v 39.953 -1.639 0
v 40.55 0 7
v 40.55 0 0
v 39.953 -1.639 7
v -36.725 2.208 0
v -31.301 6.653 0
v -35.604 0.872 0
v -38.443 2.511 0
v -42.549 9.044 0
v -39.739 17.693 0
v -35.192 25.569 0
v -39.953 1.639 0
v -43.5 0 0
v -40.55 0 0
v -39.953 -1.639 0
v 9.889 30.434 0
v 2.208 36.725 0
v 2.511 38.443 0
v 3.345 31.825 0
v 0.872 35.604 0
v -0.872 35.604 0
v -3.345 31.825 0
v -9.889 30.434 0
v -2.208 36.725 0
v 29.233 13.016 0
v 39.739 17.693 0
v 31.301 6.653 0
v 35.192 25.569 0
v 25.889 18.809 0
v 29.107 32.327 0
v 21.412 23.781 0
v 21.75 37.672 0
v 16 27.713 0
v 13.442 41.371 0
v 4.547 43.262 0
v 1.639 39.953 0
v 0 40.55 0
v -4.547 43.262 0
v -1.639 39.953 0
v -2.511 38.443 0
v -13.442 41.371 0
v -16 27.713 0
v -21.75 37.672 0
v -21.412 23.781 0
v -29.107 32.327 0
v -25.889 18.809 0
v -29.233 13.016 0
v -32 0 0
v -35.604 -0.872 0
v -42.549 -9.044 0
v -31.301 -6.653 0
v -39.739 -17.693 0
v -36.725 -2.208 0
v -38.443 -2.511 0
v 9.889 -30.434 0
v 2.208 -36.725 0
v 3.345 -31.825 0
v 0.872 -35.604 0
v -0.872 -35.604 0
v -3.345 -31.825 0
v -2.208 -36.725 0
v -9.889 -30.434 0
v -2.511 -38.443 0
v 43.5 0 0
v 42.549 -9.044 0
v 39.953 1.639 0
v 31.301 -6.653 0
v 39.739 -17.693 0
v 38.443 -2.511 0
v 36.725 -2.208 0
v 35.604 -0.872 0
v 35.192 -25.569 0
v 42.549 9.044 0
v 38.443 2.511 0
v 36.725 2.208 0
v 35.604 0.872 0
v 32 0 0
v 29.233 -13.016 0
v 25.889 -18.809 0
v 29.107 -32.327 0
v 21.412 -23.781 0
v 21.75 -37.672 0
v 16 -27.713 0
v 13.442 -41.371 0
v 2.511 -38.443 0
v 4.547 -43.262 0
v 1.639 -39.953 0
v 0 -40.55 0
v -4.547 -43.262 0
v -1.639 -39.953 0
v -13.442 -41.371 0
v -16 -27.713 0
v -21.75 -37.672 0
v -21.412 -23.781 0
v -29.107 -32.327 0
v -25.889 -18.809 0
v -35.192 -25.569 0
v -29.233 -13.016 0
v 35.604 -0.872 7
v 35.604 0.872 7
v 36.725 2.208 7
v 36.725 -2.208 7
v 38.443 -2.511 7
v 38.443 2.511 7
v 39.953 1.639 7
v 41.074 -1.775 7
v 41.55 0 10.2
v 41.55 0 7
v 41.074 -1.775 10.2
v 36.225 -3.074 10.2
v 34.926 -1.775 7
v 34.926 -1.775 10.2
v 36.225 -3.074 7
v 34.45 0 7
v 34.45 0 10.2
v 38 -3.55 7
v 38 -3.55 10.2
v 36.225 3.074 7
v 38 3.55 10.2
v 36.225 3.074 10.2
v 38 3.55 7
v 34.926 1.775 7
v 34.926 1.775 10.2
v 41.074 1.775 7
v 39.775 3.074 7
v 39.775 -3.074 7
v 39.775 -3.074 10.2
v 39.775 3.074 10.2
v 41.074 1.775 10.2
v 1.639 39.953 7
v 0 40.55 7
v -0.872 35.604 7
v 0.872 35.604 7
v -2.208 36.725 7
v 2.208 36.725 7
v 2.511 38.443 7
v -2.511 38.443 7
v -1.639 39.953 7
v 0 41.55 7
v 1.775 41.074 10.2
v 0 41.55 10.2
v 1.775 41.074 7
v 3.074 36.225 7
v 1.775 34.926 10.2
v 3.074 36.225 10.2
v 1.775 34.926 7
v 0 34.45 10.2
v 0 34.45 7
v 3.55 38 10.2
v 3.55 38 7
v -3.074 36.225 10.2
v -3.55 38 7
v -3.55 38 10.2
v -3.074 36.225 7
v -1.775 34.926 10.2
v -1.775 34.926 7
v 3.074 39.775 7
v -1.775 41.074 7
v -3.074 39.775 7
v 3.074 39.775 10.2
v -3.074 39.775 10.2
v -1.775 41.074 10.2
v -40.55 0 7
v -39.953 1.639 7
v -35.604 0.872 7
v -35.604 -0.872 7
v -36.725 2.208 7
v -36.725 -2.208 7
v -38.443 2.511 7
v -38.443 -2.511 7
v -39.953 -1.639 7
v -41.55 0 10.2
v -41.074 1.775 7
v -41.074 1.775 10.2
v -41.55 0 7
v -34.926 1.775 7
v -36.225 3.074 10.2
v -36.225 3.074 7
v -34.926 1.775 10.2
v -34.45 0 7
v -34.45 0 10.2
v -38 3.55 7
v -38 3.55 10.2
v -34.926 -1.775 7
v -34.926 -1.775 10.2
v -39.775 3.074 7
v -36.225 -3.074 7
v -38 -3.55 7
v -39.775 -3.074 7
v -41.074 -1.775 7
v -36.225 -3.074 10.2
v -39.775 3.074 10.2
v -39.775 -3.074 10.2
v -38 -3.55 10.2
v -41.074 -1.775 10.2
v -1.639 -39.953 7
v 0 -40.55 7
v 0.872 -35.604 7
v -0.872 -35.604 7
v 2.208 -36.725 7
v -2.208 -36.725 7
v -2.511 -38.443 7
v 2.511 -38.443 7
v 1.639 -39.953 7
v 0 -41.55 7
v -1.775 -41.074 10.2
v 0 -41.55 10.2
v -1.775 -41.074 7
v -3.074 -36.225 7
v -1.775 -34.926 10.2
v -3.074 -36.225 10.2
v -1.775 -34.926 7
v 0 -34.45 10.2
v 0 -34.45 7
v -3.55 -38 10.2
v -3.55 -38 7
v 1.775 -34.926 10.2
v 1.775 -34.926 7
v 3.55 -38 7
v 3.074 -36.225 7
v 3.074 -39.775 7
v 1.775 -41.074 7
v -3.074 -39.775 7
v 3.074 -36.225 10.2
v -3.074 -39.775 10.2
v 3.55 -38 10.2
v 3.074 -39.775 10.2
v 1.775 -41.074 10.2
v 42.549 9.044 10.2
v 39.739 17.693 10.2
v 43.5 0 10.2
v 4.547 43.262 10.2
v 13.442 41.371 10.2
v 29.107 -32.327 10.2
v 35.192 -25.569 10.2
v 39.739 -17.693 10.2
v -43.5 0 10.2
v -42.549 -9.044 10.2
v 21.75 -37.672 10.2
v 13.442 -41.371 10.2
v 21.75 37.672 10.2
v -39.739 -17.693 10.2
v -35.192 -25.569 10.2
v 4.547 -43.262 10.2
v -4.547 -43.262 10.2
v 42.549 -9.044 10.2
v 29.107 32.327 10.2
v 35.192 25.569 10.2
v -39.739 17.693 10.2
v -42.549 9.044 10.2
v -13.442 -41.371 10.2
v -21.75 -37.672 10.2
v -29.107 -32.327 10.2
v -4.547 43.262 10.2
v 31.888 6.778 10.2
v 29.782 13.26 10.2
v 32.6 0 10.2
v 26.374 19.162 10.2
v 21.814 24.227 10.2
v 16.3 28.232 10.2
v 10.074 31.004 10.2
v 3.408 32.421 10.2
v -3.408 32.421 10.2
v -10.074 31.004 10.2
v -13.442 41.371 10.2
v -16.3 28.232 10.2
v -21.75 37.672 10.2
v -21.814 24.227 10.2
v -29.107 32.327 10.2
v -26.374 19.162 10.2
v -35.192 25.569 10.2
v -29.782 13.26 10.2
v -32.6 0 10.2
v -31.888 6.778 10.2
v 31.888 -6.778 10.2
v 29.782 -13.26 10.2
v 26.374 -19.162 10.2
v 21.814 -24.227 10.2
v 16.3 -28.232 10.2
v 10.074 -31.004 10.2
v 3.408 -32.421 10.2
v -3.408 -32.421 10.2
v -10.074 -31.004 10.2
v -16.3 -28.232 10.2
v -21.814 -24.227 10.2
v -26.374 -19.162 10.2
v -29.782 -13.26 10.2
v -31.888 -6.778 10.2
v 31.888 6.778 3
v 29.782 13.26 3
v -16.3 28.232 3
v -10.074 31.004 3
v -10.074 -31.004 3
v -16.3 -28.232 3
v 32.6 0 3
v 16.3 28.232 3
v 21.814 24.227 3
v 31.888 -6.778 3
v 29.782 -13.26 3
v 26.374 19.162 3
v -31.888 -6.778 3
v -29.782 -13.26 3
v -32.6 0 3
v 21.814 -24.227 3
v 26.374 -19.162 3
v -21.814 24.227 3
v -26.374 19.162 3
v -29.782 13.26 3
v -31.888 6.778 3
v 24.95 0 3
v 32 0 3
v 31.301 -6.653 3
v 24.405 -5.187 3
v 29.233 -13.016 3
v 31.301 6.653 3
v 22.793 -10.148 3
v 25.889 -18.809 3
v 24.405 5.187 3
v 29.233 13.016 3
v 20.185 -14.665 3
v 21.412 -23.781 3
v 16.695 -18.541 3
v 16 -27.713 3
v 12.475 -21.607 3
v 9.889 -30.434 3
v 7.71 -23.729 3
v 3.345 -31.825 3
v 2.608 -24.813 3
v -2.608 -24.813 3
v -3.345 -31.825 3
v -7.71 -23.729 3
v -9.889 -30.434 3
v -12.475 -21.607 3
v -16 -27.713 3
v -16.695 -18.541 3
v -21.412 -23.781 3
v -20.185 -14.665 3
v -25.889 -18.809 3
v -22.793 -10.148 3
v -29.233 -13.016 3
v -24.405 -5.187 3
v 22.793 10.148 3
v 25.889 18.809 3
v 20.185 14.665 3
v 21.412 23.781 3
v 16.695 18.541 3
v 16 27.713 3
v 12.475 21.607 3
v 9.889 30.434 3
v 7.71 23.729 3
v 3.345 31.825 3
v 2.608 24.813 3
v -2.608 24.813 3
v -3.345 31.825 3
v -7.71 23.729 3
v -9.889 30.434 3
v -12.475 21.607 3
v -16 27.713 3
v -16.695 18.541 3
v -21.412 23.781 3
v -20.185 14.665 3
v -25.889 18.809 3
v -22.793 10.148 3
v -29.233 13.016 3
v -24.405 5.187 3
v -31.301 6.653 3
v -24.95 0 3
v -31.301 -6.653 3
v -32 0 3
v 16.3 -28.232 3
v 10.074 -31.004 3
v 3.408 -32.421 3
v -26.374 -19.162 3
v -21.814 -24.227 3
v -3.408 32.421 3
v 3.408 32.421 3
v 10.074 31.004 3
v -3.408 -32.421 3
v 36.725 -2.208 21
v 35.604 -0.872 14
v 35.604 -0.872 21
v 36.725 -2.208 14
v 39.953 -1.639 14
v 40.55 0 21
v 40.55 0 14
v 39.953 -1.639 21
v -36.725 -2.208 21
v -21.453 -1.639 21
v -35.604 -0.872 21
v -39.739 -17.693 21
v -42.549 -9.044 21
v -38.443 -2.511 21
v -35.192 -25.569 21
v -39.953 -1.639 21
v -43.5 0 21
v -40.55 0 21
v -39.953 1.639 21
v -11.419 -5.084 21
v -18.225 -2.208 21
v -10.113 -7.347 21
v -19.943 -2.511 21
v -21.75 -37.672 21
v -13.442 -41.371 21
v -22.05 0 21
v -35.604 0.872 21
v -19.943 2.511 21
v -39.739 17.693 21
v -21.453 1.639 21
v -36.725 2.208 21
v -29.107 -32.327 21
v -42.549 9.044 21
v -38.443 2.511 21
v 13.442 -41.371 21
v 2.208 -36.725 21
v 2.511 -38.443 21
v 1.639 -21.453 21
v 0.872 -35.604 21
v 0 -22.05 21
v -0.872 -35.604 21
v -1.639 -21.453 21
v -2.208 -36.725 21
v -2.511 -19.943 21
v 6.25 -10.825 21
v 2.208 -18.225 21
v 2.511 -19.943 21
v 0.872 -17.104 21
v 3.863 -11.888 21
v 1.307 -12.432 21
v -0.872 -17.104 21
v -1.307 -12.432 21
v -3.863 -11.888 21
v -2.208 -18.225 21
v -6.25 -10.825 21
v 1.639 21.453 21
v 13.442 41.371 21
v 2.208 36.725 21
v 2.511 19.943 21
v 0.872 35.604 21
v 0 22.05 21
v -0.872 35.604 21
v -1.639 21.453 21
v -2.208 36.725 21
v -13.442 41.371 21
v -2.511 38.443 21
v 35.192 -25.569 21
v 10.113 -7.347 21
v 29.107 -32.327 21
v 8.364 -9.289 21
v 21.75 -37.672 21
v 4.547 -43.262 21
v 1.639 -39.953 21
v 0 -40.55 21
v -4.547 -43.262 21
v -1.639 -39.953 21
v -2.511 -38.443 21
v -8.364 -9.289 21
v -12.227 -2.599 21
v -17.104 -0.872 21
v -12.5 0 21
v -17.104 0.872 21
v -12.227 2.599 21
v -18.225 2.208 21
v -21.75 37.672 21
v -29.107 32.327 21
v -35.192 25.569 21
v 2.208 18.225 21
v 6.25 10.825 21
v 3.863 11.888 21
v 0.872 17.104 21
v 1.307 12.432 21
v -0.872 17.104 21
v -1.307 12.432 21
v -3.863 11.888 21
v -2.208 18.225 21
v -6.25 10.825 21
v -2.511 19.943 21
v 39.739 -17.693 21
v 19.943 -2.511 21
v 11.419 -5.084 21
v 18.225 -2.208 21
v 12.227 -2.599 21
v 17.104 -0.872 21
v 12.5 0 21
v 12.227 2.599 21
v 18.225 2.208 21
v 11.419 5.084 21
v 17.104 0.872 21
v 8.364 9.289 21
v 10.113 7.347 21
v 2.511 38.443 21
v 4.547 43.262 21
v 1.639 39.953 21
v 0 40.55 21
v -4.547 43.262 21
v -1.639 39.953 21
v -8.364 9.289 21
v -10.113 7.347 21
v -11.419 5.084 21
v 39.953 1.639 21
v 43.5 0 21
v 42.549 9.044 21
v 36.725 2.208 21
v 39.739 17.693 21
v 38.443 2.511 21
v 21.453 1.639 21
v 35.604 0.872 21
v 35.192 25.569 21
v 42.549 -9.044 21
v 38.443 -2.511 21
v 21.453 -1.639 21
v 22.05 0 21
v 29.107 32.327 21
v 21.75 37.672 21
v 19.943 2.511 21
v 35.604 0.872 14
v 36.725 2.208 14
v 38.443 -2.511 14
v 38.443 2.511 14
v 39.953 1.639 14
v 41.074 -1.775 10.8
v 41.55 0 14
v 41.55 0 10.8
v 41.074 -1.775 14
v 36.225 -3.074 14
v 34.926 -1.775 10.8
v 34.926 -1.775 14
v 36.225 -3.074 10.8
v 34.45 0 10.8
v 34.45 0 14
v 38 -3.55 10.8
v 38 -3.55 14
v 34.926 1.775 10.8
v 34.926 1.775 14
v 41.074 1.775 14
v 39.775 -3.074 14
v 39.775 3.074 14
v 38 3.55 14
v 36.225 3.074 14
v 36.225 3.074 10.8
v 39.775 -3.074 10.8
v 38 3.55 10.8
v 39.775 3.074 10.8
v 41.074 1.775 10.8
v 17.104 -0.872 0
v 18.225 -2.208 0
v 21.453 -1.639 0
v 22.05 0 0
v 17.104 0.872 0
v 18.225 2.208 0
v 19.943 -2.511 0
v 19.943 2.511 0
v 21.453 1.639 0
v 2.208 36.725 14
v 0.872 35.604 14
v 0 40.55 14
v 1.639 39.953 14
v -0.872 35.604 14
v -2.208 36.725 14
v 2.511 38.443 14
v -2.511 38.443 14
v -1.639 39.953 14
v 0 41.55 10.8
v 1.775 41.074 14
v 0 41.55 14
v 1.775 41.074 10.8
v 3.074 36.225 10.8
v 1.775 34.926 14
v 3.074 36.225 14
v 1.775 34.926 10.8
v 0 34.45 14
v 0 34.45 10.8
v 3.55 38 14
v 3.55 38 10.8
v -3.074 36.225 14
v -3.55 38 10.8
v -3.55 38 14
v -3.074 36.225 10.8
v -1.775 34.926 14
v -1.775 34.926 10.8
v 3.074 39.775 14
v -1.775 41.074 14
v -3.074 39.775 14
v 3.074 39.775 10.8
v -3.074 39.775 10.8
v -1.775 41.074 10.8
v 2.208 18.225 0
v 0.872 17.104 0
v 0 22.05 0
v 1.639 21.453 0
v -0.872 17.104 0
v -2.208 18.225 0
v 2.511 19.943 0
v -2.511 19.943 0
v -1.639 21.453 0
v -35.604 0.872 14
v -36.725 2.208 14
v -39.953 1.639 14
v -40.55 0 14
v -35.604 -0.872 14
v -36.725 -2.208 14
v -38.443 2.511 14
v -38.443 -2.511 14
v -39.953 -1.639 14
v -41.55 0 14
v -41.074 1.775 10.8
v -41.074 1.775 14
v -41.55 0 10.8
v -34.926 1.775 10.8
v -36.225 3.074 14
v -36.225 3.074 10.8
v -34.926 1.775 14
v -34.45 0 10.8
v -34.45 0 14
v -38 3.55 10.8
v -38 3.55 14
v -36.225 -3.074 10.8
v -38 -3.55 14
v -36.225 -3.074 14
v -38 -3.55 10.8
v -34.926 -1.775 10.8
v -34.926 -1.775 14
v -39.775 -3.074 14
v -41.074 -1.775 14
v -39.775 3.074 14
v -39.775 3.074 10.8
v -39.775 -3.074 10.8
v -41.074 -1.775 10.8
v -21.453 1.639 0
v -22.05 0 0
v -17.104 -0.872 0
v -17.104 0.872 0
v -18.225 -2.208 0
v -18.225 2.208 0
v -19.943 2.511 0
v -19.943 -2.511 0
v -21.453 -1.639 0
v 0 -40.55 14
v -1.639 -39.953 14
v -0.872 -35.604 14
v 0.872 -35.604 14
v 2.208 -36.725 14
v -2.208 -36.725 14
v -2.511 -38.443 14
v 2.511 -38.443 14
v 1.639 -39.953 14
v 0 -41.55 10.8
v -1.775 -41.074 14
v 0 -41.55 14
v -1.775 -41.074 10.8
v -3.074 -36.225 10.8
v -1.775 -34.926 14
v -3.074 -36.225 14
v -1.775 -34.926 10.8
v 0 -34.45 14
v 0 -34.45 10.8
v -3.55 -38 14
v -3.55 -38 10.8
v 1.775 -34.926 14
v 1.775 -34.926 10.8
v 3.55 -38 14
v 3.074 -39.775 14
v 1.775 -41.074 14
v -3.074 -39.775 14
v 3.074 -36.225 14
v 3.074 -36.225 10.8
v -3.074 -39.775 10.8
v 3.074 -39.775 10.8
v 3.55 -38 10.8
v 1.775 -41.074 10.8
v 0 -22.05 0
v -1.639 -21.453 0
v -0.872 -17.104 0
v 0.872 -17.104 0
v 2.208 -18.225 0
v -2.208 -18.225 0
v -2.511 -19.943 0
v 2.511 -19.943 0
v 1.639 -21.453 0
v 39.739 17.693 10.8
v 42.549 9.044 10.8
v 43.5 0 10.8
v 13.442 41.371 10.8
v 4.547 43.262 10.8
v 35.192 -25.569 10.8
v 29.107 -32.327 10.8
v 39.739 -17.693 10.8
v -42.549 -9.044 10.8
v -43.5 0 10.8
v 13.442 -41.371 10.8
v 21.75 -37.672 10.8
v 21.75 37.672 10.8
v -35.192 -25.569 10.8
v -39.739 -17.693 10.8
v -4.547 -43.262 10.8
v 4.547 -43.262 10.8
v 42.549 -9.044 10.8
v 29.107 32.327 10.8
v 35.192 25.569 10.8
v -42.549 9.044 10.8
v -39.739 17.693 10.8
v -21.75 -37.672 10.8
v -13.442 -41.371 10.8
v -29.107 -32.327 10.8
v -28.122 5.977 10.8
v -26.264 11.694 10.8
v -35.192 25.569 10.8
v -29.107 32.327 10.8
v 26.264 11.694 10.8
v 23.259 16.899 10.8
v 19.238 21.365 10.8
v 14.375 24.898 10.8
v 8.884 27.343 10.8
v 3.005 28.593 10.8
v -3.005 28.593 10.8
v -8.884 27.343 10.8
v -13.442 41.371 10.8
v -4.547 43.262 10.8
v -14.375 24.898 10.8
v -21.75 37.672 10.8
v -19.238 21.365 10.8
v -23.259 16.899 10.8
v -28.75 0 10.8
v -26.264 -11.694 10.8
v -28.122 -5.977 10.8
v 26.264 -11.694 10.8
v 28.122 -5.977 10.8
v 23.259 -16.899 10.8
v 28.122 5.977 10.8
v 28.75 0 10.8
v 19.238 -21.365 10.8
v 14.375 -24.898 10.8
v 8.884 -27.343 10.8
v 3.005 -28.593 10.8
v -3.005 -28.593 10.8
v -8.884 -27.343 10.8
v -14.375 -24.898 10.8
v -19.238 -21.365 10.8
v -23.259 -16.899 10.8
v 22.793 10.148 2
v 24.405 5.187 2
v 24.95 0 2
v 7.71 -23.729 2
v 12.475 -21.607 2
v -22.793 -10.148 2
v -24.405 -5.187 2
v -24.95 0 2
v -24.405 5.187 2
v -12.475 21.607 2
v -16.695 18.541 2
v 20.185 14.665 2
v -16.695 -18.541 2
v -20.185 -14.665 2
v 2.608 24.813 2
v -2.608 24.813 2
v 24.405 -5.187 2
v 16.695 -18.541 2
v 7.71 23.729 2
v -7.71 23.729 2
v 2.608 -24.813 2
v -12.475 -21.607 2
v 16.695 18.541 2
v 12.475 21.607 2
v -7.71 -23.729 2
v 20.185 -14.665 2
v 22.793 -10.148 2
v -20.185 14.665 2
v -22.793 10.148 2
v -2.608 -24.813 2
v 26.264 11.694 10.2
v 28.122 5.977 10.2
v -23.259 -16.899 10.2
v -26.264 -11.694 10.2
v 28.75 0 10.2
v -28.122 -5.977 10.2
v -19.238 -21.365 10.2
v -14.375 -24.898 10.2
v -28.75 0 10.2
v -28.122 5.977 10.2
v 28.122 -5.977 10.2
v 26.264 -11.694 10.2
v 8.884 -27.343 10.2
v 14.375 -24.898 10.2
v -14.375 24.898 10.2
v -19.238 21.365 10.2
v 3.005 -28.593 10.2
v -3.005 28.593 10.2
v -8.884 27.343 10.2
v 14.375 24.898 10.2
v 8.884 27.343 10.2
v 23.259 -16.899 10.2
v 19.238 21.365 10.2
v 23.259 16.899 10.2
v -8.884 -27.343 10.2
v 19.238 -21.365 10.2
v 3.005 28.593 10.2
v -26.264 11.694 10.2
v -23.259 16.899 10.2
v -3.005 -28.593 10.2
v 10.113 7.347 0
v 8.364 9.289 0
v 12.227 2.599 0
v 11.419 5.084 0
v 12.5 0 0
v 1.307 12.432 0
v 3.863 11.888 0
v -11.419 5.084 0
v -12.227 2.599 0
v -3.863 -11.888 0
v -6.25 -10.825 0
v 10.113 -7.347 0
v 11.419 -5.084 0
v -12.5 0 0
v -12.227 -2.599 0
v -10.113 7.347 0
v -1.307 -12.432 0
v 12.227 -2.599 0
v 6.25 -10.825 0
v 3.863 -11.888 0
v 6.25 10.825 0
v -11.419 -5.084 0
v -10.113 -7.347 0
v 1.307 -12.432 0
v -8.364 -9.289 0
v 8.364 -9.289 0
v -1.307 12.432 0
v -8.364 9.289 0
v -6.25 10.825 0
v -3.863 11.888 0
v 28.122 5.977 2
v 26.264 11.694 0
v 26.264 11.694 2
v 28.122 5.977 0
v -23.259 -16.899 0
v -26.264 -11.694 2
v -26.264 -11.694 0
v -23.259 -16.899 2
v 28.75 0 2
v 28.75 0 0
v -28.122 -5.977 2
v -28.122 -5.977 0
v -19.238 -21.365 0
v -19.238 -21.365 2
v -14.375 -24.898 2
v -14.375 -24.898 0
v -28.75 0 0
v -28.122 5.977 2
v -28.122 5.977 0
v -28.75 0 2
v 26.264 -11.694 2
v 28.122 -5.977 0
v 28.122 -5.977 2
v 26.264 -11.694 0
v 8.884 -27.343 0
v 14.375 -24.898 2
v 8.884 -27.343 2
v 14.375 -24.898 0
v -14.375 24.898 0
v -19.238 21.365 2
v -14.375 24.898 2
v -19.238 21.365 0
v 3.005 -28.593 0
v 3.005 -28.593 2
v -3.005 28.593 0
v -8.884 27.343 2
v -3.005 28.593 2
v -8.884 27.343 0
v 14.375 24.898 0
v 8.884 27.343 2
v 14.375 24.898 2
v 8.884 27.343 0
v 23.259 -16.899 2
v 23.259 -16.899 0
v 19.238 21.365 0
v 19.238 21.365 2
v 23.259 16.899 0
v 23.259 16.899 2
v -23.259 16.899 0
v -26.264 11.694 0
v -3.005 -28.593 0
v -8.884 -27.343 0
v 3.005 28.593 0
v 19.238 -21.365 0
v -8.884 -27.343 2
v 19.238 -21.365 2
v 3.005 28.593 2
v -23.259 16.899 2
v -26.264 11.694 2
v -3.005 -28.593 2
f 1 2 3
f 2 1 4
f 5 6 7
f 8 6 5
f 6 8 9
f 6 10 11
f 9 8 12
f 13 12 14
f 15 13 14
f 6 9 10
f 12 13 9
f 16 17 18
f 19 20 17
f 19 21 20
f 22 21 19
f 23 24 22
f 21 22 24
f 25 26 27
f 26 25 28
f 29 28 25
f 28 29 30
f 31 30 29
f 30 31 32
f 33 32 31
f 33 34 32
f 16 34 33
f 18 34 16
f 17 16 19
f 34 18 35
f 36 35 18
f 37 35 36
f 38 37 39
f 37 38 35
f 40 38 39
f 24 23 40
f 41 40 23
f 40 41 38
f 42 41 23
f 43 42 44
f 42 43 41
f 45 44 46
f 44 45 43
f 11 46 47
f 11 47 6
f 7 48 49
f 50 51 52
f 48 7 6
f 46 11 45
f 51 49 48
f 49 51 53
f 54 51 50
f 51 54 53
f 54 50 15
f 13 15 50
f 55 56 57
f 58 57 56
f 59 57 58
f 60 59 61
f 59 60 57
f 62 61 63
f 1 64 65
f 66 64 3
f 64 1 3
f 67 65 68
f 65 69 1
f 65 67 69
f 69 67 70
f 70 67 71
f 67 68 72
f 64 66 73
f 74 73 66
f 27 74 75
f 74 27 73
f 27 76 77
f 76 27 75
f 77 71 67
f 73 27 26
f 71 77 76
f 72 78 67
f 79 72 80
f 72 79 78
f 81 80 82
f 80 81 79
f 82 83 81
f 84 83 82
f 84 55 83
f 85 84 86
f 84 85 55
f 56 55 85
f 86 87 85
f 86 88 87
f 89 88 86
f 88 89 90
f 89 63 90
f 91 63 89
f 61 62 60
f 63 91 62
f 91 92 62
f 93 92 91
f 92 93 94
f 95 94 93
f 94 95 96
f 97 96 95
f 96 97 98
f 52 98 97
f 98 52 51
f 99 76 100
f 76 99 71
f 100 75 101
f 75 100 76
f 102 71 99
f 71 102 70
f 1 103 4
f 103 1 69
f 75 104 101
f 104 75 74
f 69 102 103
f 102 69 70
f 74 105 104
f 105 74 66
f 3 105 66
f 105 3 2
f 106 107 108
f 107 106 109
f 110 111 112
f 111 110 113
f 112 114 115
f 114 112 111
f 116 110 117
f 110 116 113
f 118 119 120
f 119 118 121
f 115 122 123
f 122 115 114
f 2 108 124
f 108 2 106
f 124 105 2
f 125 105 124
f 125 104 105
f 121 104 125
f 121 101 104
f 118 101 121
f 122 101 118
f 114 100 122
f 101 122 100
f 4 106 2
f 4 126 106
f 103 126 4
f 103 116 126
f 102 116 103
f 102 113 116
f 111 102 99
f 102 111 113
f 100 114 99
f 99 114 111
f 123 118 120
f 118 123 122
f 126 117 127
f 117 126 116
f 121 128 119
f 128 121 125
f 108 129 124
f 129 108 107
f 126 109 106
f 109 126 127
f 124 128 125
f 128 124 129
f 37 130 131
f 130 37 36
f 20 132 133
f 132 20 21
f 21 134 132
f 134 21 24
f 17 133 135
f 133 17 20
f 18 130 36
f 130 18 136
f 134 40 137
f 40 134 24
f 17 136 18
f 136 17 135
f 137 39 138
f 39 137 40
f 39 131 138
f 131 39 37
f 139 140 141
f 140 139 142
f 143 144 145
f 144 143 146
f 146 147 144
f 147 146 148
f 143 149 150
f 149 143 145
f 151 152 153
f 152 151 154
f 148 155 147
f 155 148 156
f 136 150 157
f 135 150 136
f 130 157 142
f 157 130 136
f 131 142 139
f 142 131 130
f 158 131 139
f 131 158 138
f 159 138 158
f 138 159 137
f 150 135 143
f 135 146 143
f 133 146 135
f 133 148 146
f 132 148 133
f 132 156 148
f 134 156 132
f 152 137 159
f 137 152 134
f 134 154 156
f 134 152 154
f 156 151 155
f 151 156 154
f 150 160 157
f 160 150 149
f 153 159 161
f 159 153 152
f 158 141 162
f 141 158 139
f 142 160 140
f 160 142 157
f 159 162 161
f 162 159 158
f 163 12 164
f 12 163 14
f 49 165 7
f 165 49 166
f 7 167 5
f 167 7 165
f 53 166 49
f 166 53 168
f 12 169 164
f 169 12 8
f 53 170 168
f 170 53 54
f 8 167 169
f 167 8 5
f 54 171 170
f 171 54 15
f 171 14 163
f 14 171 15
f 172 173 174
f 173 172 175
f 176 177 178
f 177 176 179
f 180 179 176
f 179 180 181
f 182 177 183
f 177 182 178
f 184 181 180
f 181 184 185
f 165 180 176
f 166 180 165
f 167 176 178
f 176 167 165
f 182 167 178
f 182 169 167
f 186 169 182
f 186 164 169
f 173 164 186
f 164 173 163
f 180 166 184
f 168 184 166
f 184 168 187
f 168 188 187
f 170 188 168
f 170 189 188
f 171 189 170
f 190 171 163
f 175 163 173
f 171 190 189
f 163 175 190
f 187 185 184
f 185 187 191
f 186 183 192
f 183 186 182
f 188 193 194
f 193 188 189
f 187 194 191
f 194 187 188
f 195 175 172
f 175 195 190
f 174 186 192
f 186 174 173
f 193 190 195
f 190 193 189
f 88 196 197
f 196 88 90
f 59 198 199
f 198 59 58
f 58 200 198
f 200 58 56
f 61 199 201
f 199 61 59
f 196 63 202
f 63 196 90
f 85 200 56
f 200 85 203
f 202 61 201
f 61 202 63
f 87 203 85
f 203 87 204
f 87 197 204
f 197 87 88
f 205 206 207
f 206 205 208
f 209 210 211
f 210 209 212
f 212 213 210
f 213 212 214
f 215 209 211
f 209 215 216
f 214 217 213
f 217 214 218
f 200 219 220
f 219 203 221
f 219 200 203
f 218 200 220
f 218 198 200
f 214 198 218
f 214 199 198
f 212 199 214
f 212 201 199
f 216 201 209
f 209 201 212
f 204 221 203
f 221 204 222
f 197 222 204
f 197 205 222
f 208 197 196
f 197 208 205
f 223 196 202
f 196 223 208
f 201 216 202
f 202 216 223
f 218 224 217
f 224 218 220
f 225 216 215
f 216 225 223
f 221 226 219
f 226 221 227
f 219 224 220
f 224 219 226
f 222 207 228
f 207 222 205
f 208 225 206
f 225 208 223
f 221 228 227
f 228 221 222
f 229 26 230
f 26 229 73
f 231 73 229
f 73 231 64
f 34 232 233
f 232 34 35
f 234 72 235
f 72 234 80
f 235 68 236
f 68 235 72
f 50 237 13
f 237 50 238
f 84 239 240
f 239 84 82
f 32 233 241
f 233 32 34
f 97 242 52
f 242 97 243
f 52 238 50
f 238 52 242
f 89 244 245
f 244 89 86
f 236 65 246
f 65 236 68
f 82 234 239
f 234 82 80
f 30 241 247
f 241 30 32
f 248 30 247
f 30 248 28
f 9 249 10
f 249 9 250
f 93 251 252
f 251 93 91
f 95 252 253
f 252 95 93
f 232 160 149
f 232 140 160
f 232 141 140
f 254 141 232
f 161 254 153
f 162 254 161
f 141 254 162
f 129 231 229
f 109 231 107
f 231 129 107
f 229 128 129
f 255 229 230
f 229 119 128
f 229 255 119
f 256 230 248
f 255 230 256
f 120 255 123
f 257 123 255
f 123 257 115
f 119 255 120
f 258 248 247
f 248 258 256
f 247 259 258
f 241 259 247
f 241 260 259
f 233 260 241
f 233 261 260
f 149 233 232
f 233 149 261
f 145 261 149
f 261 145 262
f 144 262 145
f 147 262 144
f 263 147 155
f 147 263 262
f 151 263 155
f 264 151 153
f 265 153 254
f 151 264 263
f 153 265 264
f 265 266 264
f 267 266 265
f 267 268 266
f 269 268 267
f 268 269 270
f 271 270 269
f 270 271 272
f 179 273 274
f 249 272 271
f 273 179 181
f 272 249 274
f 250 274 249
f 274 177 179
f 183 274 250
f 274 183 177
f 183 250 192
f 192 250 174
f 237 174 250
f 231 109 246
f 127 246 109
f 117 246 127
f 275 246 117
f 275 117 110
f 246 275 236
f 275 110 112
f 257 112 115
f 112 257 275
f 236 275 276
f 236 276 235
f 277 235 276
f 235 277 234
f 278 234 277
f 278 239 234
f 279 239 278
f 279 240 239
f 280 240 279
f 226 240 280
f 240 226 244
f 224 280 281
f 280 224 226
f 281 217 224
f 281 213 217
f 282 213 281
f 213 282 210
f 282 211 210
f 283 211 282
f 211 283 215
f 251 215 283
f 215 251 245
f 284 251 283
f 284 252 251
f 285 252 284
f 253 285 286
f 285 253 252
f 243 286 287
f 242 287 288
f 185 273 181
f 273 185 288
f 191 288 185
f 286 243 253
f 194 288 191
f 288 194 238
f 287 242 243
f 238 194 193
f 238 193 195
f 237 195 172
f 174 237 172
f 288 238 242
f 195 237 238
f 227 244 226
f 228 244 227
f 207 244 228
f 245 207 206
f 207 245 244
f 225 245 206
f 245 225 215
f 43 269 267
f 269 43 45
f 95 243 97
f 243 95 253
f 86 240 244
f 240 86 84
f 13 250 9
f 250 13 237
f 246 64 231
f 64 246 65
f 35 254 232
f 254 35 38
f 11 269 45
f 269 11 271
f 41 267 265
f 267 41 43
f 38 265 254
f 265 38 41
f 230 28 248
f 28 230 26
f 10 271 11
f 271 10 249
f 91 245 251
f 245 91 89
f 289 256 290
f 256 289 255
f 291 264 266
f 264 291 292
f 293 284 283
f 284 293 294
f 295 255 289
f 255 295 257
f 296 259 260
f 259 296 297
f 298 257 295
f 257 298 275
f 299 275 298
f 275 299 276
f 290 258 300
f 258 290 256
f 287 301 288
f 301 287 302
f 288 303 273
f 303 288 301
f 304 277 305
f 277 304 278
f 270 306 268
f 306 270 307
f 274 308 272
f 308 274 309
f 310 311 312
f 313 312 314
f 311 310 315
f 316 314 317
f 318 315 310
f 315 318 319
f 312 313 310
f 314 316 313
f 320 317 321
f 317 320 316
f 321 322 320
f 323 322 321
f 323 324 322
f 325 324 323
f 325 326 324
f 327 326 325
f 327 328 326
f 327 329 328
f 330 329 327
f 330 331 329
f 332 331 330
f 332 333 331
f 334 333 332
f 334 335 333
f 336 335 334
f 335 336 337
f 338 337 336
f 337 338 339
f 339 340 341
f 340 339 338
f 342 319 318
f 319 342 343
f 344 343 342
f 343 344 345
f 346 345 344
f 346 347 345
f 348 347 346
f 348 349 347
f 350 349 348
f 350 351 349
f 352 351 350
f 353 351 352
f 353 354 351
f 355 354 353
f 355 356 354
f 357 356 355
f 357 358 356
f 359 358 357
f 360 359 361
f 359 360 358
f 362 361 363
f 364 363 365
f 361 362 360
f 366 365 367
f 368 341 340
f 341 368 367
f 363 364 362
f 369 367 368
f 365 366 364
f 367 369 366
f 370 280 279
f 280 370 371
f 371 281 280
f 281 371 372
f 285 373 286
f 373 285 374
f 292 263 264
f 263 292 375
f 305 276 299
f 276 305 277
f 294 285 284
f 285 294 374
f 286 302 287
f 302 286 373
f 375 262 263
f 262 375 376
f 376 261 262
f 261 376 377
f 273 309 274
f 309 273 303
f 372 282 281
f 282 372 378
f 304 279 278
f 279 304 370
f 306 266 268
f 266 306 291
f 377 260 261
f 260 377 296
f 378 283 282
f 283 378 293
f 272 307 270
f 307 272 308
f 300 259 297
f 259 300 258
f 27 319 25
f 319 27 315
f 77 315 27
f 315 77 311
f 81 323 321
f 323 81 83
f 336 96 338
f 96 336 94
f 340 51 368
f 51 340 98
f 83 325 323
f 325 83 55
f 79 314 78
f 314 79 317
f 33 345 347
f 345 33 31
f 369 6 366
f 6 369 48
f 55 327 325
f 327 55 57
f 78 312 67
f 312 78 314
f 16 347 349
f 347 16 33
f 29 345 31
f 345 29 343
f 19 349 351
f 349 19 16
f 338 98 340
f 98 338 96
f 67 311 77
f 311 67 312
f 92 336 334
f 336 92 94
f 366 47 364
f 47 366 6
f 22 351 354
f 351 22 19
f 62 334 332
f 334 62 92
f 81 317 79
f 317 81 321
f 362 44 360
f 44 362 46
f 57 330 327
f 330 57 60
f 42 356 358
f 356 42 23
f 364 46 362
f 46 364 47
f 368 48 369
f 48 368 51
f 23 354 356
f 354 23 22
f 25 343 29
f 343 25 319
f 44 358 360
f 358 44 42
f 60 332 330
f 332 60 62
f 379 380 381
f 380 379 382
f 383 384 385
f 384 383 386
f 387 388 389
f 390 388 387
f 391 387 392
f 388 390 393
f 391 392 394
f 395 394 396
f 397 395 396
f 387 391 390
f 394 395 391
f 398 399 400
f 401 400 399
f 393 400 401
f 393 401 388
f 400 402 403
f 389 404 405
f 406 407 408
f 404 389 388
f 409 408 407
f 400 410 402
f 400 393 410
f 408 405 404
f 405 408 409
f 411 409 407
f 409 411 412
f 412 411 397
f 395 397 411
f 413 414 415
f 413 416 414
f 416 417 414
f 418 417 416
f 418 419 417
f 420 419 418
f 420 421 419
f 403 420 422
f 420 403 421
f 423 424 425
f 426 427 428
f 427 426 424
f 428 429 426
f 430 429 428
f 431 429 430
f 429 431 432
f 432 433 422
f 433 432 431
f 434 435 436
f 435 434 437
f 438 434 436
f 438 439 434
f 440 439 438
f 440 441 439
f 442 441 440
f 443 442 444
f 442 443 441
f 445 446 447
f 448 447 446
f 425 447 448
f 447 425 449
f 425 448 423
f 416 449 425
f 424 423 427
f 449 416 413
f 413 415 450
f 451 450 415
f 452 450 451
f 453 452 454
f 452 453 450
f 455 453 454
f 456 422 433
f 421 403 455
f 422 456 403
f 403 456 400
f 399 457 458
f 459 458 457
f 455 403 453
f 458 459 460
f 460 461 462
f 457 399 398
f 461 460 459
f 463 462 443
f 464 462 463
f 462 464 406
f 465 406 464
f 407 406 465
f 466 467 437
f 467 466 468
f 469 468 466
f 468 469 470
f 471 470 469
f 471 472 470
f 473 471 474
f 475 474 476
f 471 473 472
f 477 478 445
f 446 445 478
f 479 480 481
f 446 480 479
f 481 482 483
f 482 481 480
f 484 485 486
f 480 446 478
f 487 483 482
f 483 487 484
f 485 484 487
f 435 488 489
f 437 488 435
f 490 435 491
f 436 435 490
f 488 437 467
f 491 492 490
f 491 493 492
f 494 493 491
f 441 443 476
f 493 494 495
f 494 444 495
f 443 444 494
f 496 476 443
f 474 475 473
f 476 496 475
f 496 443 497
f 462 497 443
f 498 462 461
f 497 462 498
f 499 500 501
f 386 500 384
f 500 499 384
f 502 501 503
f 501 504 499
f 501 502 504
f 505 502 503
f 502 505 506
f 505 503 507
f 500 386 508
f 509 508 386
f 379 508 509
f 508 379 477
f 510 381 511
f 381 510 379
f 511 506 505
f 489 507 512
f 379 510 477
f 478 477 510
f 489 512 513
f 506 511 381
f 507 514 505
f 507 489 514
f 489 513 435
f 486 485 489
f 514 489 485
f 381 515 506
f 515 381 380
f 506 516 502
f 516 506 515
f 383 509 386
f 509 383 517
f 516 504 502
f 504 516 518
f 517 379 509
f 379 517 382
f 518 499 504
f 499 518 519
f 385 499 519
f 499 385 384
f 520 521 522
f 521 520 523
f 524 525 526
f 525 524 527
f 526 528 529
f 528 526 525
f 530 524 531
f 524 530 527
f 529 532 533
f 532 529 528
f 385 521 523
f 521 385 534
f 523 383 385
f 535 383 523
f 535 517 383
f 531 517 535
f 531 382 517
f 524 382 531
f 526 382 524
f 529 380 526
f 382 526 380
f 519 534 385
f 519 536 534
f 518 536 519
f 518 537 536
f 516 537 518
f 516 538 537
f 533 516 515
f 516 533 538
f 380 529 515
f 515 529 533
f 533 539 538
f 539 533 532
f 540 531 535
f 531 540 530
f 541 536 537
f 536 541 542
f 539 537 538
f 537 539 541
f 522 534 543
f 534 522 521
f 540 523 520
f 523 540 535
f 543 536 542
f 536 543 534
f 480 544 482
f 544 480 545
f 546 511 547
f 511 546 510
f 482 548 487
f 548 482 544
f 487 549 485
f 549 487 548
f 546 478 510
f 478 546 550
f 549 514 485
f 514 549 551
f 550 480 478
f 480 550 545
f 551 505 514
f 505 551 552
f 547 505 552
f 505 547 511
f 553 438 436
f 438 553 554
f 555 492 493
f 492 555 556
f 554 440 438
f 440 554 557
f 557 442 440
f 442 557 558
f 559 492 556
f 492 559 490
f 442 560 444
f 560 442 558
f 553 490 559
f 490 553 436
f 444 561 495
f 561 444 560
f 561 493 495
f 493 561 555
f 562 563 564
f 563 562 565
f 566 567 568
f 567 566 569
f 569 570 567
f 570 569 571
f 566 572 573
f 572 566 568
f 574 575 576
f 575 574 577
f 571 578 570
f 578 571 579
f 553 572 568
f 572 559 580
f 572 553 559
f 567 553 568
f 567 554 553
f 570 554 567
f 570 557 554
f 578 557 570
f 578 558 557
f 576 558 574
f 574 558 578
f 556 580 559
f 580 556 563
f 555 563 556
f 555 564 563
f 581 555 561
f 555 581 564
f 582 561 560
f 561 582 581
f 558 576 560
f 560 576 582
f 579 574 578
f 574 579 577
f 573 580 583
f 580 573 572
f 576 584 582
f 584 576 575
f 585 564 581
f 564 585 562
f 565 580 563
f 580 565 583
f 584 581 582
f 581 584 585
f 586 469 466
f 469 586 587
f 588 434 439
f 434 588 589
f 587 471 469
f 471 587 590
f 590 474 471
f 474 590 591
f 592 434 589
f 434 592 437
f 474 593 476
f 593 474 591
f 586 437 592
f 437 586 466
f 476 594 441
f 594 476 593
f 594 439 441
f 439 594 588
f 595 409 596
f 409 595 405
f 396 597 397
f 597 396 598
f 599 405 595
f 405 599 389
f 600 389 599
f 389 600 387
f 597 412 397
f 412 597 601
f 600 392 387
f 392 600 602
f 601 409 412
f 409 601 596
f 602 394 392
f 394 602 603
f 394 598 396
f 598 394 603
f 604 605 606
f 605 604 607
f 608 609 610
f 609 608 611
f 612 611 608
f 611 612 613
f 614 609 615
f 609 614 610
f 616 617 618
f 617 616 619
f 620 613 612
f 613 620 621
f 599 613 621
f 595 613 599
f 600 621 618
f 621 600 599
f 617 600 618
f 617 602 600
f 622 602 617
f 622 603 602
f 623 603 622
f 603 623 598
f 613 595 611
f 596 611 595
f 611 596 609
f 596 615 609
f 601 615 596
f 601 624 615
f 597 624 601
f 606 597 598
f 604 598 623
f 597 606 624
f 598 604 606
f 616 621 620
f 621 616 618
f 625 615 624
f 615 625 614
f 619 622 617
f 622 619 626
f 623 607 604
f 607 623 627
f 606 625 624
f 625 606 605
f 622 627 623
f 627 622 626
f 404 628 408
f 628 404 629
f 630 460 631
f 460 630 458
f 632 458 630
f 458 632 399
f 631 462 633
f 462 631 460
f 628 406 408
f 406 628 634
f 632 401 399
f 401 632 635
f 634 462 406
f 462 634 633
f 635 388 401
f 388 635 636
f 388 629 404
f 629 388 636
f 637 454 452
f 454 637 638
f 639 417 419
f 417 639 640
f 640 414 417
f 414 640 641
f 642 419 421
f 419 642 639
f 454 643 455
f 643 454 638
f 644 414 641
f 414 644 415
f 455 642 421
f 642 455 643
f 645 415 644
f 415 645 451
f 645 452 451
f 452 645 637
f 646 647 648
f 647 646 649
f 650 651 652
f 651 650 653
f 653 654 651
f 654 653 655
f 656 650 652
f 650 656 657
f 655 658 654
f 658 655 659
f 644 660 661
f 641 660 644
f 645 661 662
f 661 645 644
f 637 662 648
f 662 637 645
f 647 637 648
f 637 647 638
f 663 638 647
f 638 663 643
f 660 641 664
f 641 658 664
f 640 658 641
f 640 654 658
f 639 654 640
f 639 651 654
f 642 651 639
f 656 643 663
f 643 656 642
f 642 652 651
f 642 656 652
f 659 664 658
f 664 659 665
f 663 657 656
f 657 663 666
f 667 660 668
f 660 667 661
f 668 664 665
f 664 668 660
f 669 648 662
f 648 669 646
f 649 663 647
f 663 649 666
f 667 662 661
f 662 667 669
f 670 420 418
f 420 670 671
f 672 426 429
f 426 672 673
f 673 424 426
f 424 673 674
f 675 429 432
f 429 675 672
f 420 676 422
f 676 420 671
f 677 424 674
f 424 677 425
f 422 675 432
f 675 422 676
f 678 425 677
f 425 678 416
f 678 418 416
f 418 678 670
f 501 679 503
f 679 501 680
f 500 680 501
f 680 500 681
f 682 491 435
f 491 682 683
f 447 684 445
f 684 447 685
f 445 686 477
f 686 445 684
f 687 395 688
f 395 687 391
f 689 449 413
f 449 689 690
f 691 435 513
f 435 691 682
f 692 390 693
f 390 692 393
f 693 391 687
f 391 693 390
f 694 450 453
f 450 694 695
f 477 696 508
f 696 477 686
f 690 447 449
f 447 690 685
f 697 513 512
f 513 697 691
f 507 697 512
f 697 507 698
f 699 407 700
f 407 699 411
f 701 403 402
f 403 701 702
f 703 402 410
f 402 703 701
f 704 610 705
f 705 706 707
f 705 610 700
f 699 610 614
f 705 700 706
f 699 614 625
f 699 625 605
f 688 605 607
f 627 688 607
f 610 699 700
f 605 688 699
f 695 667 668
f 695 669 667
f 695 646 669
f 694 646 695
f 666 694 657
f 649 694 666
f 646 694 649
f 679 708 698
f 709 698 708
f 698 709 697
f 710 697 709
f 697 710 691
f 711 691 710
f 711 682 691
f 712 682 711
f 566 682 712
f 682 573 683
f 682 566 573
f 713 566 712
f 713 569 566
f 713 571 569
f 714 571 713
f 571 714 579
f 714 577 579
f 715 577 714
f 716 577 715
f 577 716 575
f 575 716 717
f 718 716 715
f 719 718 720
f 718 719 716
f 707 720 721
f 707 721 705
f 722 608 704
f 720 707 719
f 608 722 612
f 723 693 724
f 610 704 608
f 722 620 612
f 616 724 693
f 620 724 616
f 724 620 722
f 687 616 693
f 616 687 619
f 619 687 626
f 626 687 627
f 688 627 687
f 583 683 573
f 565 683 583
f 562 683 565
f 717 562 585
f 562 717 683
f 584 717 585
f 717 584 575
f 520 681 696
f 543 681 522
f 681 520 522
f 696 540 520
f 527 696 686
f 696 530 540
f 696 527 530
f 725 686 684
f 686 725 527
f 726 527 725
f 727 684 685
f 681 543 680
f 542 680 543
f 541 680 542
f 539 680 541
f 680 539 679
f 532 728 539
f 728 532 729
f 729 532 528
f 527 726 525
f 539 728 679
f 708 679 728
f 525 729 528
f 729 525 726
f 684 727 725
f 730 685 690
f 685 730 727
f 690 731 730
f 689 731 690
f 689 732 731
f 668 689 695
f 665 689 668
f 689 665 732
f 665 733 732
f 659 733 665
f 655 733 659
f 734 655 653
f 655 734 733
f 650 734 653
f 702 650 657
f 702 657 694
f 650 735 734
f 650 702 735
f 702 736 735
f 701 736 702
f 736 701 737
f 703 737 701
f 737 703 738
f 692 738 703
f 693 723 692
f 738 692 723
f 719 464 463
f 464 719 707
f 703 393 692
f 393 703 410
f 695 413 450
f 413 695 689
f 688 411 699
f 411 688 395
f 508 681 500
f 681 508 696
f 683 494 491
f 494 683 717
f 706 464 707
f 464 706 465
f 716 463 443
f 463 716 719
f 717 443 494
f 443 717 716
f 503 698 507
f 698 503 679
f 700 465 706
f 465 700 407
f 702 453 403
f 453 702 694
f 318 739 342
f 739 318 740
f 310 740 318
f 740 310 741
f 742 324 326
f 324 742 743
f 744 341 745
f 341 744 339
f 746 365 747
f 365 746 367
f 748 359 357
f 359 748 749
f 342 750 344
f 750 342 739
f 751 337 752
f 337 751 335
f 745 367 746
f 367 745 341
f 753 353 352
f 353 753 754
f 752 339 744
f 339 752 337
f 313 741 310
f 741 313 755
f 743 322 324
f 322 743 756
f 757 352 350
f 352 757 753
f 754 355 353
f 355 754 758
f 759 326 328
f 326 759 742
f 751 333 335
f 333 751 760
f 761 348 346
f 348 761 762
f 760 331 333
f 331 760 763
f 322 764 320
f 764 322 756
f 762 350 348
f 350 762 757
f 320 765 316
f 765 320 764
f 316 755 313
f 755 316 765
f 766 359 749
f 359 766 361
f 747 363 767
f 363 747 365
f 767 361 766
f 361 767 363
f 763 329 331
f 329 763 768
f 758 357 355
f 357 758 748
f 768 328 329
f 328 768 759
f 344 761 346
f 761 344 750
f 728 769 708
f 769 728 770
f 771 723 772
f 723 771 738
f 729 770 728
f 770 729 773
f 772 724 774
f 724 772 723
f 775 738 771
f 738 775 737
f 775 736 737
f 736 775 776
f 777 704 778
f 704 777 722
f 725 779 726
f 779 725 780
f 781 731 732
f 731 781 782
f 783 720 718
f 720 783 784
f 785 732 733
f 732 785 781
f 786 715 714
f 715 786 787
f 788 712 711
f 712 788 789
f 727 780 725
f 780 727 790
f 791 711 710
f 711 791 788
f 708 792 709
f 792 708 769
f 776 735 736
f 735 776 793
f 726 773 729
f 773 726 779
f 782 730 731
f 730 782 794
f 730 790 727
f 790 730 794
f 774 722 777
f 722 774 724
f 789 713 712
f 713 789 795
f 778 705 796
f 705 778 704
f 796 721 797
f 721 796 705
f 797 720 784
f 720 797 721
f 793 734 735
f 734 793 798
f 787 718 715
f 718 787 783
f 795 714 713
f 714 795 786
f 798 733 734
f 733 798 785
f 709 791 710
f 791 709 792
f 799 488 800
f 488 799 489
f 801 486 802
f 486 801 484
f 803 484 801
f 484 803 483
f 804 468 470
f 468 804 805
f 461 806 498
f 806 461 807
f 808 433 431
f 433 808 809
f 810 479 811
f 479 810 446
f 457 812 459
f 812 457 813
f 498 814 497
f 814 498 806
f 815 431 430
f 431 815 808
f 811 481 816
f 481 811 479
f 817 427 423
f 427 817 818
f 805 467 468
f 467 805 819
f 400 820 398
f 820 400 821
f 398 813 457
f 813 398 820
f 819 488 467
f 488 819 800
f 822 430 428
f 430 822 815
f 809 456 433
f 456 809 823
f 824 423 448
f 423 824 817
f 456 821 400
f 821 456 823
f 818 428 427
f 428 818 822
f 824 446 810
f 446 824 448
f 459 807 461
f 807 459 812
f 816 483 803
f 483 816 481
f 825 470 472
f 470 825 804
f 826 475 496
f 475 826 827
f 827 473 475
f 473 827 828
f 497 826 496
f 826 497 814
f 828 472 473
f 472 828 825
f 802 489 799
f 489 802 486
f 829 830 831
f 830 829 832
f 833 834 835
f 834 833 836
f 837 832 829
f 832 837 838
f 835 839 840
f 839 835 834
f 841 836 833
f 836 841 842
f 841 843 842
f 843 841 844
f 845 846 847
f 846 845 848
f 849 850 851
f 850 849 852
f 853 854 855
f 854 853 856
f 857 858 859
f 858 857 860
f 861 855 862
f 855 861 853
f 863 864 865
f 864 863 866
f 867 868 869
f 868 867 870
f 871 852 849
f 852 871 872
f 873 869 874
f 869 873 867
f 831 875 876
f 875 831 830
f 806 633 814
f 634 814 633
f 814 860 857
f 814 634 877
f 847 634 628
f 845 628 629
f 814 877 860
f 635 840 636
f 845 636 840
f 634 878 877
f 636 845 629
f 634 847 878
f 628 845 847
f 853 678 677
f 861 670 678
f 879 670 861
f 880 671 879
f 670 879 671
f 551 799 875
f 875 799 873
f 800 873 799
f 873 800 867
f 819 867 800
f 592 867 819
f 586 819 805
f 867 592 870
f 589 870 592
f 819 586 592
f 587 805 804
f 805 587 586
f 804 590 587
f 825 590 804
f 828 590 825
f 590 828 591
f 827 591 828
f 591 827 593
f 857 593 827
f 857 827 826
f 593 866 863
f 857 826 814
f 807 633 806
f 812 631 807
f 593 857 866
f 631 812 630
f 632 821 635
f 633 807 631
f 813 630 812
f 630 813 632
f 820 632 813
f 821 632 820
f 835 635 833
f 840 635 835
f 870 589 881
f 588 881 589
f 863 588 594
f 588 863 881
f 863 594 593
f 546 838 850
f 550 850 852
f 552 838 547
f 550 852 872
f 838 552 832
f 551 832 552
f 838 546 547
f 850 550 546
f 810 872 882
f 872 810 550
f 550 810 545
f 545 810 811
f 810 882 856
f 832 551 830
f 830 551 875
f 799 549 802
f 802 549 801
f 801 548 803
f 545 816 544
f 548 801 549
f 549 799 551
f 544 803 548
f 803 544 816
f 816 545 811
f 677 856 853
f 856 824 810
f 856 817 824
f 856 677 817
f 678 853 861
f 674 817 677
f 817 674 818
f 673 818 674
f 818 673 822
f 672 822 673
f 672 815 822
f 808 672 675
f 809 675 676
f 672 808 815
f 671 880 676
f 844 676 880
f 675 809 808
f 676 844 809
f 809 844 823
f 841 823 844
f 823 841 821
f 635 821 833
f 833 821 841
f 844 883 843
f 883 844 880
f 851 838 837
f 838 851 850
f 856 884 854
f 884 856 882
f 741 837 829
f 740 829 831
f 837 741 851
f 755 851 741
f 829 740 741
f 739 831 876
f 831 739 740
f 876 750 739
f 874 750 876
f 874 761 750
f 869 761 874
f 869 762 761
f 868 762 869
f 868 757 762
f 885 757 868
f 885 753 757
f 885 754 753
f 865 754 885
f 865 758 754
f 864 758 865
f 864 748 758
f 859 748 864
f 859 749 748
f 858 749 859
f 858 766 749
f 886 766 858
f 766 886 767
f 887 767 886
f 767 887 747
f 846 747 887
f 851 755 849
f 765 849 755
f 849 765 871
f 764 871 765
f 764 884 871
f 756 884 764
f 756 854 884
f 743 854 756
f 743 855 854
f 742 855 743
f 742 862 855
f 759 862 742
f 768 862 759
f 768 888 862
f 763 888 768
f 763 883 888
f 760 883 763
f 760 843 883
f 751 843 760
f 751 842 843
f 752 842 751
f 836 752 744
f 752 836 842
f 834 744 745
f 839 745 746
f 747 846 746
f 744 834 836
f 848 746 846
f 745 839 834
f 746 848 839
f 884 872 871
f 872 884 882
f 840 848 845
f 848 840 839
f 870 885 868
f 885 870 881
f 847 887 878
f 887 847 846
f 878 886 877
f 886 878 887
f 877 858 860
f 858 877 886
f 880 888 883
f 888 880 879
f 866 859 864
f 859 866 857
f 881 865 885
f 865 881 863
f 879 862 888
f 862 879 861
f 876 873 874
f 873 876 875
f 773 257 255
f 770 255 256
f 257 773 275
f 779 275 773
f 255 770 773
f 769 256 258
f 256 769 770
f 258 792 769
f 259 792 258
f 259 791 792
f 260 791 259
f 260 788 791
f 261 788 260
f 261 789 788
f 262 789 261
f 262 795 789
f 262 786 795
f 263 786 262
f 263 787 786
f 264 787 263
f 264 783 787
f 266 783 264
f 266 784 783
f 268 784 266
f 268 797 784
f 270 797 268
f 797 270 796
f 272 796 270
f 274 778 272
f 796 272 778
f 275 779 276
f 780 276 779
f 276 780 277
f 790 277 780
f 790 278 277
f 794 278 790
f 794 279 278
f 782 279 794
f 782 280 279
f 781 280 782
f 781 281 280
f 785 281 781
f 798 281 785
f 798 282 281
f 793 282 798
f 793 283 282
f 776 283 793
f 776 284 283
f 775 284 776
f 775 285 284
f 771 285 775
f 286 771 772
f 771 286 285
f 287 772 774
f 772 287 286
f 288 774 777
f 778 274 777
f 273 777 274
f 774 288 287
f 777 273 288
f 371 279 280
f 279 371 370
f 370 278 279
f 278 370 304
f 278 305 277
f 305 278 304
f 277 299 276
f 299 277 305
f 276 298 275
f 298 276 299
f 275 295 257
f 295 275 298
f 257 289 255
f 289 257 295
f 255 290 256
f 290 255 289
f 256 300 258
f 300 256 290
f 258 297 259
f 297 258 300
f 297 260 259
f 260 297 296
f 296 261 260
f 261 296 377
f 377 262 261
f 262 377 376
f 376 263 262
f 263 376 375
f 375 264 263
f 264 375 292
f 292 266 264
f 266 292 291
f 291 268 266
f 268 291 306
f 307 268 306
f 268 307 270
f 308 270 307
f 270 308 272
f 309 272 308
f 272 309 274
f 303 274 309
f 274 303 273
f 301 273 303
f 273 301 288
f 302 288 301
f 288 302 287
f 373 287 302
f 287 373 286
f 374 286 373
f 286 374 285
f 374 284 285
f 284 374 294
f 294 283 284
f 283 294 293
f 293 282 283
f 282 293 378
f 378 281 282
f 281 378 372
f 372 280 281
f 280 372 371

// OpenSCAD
//$fn=255;

tollerance = 0.1;
margin=3;
base_height=3;

screw=5;

module ring(inner_diameter, outer_diameter, height){
    translate([0,0,base_height])
    linear_extrude(height + 2 * tollerance){
        difference(){
            circle(d=(outer_diameter + 2*tollerance));
            circle(d=(inner_diameter - 2 * tollerance));
        }
    }
}

module base(inner_diameter, outer_diameter, height) {
    difference(){ 
        linear_extrude(height + base_height + tollerance * 2)
        circle(r=(outer_diameter/2 + margin * 2 + screw));
        
        translate([0, 0, base_height])
        linear_extrude(height + 2 * tollerance + base_height)
        circle(d=(outer_diameter + 2 * tollerance));
        
        for(i=[0:90:360]){
            rotate(i){                
                translate([outer_diameter/2 + margin + screw/2, 0, 0])
                linear_extrude(height * 3)
                circle(d=(screw+tollerance));            

                translate([outer_diameter/2 + margin + screw /2, 0, height])
                linear_extrude(height * 3)
                circle(d=(screw+tollerance+2));            
            }
        }
                
        linear_extrude(height*10,center=true){
            circle(d=(outer_diameter - 1));        
        }
        
            
        linear_extrude(height*10,center=true){
            circle(d=(inner_diameter - margin));
        }
    }          
}

module top(inner_diameter, outer_diameter, height) {
    difference(){
        translate([0,0,2*(height+base_height)+1])
        mirror([0,0,1]) 
        union(){
            difference(){ 
                linear_extrude(height + base_height + tollerance * 2)
                circle(r=(outer_diameter/2 + margin * 2 + screw));
                            
               for(i=[0:90:360]){
                    rotate(i){       
              
                        // outer screws         
                        translate([outer_diameter/2 + margin + screw/2, 0, 0])
                        linear_extrude(height * 3)
                        circle(d=(screw+tollerance));            

                        translate([outer_diameter/2 + margin + screw /2, 0, height])
                        linear_extrude(height * 3)
                        circle(d=(screw+tollerance+2));      

                        // inner screws
                        translate([inner_diameter/2 - margin - screw/2, 0, 0])
                        linear_extrude(height * 3)
                        circle(d=(screw+tollerance));                  
                     
                    }
                }
                        
            }          
                  
            difference(){   
            translate([0,0,height + base_height]){
                linear_extrude(height+tollerance+2)
                circle(d=(inner_diameter - tollerance));

                linear_extrude(2)
                circle(d=(inner_diameter + (outer_diameter-inner_diameter)/2));
            
            }
                   for(i=[0:90:360]){
                    rotate(i){                            // inner screws
                        translate([inner_diameter/2 - margin - screw/2, 0, 0])
                        linear_extrude(height * 3)
                        circle(d=(screw+tollerance)); 
            }
        }
    }
        }
        
        
        
        
        
        linear_extrude(height*10,center=true){
            circle(d=(inner_diameter/2));
        }

    }
}


module topHat(inner_diameter, outer_diameter, height){
    translate([0,0,-height - base_height])
     difference(){   
            translate([0,0,height + base_height]){
                
                linear_extrude(2)
                circle(d=(inner_diameter + (outer_diameter-inner_diameter)/2));
            
            }
                   for(i=[0:90:360]){
                    rotate(i){                            // inner screws
                        translate([inner_diameter/2 - margin - screw/2, 0, 0])
                        linear_extrude(height * 3)
                        circle(d=(screw+tollerance)); 
            }
        }
        
        linear_extrude(height*10,center=true){
            circle(d=(inner_diameter/2));
        }
        }
    }
///////////////////////////////

module ring_50_65(){
    inner_diameter = 50;
    outer_diameter = 65;
    height = 7;
    ring(inner_diameter, outer_diameter, height);
}

module base_50_65(){
    inner_diameter = 50;
    outer_diameter = 65;
    height = 7;
    base(inner_diameter, outer_diameter, height);
}

module top_50_65(){
    inner_diameter = 50;
    outer_diameter = 65;
    height = 7;
    top(inner_diameter, outer_diameter, height);
}

module topHat_50_65(){
    inner_diameter = 50;
    outer_diameter = 65;
    height = 7;
    topHat(inner_diameter, outer_diameter, height);
}

///////////////////////////////

module ring_10_26(){
    inner_diameter = 10;
    outer_diameter = 26;
    height = 8;
    ring(inner_diameter, outer_diameter, height);
}

module base_10_26(){
    inner_diameter = 10;
    outer_diameter = 26;
    height = 8;
    base(inner_diameter, outer_diameter, height);
}

module top_10_26(){
    inner_diameter = 10;
    outer_diameter = 26;
    height = 8;
    top(inner_diameter, outer_diameter, height);
}

///////////////////////////////

module ring_7_14(){
    inner_diameter = 7;
    outer_diameter = 14;
    height = 5;
    ring(inner_diameter, outer_diameter, height);
}

module base_7_14(){
    inner_diameter = 7;
    outer_diameter = 14;
    height = 5;
    base(inner_diameter, outer_diameter, height);
}

module top_7_14(){
    inner_diameter = 7;
    outer_diameter = 14;
    height = 5;
    top(inner_diameter, outer_diameter, height);
}

///////////////////////////////


//color("lightgreen")
//base_10_26();
//base_7_14();

//translate([0,0,base_height])
//color("pink")
//ring_10_26();


//ring_7_14();
//base_10_26();


translate([0,0,0]){
    color("yellow") base_50_65();
   color("gray") ring_50_65();
    color("lightgreen") top_50_65();
    color("lightblue") topHat_50_65();
}

/*
translate([80,0,0]){
    color("lightgreen") base_10_26();
    color("lightblue") ring_10_26();
    color("pink") top_10_26();
}
*/

/*
translate([130,0,0]){
    color("lightgreen") base_7_14();
    color("lightblue") ring_7_14();
    color("pink") top_7_14();
}
*/
